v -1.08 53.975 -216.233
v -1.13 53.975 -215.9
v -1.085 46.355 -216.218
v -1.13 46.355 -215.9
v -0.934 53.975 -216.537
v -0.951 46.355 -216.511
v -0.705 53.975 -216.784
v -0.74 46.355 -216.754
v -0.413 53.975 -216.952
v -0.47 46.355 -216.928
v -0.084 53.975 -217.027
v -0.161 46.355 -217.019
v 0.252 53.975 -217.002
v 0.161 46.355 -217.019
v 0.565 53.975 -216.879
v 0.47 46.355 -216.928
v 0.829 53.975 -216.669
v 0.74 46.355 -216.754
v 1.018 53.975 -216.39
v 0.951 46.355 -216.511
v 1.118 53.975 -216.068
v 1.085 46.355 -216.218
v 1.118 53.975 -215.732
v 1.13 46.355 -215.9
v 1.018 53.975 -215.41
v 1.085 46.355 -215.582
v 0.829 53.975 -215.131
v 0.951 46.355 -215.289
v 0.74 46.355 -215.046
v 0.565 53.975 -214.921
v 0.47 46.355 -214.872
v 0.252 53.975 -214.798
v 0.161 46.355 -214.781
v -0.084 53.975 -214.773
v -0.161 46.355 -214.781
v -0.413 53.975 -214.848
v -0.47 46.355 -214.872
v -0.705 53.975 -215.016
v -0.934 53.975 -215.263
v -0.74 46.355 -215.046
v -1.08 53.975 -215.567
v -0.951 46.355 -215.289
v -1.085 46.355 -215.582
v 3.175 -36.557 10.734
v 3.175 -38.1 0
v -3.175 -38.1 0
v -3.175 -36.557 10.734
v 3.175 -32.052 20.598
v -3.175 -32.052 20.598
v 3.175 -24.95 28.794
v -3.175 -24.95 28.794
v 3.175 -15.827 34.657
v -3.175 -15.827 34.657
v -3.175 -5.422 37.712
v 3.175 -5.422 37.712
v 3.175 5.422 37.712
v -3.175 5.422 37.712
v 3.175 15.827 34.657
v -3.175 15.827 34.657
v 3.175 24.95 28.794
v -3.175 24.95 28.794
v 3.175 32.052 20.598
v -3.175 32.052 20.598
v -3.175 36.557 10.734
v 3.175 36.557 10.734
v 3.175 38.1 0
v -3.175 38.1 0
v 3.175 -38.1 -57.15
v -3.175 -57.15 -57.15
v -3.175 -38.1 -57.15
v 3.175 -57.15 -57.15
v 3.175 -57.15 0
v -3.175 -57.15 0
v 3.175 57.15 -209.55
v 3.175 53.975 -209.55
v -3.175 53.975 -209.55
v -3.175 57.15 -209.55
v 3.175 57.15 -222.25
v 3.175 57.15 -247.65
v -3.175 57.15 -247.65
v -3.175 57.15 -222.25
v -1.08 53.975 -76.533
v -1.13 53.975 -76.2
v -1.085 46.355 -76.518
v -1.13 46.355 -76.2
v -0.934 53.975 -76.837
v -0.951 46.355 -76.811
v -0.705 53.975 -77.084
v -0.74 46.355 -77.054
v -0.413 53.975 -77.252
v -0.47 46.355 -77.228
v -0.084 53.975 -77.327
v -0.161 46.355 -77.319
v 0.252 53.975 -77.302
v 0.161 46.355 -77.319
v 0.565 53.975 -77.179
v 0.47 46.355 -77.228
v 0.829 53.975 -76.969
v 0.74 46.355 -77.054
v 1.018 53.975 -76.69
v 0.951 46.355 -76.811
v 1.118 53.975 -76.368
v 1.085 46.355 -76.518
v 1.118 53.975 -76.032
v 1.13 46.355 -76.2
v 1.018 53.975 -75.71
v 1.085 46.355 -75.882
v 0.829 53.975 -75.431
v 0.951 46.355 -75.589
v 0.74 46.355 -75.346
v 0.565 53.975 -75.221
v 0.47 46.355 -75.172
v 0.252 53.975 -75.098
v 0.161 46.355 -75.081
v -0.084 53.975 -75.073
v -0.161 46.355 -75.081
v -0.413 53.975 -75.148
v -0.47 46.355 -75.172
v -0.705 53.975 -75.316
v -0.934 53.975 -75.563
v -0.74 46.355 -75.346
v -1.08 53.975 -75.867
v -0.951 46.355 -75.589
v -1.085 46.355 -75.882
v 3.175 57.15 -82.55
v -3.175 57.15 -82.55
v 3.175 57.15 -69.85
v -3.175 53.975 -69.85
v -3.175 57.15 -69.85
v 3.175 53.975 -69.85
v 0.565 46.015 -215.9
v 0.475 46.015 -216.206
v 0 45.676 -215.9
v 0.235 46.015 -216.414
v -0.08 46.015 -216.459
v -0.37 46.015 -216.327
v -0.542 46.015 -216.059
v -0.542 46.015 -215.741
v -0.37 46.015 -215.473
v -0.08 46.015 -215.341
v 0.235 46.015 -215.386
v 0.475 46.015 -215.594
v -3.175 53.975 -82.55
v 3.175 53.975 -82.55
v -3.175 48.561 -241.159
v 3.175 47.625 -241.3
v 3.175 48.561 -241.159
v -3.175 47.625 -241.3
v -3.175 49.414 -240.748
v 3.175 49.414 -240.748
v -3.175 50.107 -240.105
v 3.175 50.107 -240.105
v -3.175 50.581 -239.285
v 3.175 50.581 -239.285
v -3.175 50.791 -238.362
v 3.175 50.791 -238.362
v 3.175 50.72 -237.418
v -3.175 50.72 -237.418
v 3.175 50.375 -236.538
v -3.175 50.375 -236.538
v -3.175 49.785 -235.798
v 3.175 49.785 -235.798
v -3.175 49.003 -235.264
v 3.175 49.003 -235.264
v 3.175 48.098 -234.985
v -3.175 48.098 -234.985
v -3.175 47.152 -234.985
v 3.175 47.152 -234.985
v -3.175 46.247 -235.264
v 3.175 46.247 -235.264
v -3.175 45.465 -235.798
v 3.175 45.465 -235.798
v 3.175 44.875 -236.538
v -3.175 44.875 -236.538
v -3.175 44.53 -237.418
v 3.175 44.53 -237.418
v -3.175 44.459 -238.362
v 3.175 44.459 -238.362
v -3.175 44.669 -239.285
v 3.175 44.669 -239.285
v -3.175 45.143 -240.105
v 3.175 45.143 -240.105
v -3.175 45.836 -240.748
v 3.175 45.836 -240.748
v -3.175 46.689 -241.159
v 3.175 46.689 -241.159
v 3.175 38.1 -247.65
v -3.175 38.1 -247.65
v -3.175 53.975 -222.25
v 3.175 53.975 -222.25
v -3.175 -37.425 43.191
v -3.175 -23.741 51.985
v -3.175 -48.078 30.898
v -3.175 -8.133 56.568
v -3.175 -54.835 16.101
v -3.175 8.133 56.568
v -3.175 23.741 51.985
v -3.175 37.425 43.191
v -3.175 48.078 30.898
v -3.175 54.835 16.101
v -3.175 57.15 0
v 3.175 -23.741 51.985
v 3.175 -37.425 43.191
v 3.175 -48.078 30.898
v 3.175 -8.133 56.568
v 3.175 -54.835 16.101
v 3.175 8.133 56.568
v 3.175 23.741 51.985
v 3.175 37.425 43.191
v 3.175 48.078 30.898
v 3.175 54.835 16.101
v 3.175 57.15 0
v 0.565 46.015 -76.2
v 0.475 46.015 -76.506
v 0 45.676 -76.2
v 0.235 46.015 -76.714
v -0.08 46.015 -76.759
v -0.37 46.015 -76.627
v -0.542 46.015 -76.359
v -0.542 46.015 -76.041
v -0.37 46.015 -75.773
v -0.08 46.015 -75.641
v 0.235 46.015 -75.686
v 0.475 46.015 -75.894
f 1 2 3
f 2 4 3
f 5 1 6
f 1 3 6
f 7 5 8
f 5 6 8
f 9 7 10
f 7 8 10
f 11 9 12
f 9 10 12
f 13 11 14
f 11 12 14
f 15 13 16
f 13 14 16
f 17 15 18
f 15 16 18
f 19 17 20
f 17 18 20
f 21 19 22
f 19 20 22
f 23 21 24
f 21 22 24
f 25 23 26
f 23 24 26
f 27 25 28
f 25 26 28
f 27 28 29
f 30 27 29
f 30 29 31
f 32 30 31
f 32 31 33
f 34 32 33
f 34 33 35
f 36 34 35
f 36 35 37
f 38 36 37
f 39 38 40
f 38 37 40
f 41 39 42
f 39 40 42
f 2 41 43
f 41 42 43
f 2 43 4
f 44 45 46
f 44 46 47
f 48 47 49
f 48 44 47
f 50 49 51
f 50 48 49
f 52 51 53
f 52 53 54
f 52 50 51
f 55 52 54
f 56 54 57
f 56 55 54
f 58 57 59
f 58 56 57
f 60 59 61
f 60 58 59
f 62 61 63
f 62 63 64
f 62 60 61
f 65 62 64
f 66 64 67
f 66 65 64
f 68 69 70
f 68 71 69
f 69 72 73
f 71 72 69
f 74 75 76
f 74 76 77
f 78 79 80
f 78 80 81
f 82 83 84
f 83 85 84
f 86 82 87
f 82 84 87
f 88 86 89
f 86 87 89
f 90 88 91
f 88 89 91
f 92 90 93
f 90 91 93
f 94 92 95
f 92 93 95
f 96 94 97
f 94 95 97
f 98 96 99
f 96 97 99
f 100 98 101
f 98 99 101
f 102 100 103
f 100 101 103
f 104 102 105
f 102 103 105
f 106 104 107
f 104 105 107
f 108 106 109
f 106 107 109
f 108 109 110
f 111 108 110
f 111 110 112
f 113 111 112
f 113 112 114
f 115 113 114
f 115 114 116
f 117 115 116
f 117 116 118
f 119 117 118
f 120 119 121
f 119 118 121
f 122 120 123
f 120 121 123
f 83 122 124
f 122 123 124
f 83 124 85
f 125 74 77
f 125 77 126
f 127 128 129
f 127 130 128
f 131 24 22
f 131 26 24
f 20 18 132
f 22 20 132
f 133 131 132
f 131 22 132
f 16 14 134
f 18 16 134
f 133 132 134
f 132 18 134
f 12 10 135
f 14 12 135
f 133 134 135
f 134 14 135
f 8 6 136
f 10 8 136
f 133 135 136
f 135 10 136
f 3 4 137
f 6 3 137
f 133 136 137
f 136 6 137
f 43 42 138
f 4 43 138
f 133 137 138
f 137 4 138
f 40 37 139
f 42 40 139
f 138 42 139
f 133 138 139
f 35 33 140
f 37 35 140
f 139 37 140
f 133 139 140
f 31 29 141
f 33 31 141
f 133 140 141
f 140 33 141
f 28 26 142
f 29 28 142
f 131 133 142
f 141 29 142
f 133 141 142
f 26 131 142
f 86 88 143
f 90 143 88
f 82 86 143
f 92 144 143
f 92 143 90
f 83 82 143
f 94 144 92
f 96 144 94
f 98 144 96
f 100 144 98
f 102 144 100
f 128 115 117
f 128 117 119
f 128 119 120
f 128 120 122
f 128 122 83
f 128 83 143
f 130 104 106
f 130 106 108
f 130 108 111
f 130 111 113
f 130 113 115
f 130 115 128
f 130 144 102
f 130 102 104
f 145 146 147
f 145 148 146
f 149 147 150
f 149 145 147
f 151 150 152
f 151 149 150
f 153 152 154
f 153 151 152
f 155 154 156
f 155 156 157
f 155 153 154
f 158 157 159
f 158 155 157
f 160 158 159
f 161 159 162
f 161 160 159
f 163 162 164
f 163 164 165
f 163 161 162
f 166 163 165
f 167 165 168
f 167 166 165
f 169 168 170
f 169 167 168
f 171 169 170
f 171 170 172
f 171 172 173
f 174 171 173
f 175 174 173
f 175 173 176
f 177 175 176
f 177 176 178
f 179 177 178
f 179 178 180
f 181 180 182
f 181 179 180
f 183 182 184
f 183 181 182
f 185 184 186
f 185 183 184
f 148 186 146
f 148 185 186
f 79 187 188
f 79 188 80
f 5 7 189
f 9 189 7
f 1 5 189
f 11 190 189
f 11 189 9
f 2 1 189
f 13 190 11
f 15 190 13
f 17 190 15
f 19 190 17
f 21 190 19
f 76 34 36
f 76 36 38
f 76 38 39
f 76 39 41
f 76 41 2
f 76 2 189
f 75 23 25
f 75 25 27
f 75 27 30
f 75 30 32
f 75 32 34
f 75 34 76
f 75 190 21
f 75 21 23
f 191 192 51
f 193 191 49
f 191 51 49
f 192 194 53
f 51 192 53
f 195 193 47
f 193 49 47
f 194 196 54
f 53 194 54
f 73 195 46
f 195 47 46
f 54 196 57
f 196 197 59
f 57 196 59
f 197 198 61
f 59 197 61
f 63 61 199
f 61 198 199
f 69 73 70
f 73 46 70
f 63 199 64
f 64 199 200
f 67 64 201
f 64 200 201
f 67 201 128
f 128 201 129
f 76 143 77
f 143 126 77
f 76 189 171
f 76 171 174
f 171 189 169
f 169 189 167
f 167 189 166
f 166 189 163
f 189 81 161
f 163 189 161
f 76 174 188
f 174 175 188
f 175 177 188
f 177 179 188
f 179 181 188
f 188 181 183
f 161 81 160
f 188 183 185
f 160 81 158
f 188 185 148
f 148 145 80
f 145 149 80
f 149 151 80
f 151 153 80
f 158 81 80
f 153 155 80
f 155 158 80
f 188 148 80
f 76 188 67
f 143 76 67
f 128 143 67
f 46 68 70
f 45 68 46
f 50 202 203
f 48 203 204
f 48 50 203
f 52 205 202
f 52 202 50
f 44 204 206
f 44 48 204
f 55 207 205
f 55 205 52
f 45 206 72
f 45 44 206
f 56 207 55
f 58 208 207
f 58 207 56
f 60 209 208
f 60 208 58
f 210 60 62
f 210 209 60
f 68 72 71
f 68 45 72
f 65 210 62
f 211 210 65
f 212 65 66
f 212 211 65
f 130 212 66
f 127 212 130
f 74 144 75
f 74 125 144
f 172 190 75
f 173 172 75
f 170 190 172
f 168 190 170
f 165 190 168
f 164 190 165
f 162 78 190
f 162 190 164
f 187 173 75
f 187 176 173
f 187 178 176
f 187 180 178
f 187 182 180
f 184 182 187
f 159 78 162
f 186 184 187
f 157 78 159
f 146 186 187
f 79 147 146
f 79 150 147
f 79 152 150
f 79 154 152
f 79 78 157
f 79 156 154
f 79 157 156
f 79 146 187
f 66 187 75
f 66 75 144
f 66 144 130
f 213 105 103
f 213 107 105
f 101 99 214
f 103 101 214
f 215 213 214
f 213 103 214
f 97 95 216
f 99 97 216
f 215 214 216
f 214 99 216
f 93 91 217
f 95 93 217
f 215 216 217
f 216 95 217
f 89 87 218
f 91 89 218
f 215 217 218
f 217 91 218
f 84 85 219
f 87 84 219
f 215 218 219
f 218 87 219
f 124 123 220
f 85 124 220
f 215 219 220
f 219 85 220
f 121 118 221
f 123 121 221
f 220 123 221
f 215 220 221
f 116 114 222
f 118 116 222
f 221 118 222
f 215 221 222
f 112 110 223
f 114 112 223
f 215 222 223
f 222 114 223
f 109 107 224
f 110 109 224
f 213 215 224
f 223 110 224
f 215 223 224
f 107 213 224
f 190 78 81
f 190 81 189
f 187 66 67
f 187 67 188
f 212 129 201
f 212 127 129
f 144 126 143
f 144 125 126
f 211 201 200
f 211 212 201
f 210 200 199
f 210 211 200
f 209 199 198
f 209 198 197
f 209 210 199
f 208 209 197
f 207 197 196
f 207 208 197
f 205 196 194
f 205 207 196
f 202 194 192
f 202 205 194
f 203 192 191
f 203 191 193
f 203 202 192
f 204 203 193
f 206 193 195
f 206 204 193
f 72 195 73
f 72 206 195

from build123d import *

# Parameters (mm, degrees)
SKETCH1_R                 = 3.175
BOSS_EXTRUDE1_DEPTH       = 3.175
F_4_40_TAPPED_HOLE1_D     = 2.2606
F_4_40_TAPPED_HOLE1_DEPTH = 7.62
F_4_40_TAPPED_HOLE1_TIP   = 0.679152758


with BuildPart() as part:
    # Sketch1 → Boss-Extrude1 (new body, symmetric)
    with BuildSketch(Plane(origin=(0, 0, 0), x_dir=(0, 0, -1), z_dir=(1, 0, 0))):
        with BuildLine():
            Line((57.15, -38.1), (0, -38.1))
            ThreePointArc((0, -38.1), (-38.1, 0), (0, 38.1))
            Line((0, 38.1), (247.65, 38.1))
            Line((247.65, 38.1), (247.65, 57.15))
            Line((247.65, 57.15), (222.25, 57.15))
            Line((222.25, 57.15), (222.25, 53.975))
            Line((222.25, 53.975), (209.55, 53.975))
            Line((209.55, 53.975), (209.55, 57.15))
            Line((209.55, 57.15), (82.55, 57.15))
            Line((82.55, 57.15), (82.55, 53.975))
            Line((82.55, 53.975), (69.85, 53.975))
            Line((69.85, 53.975), (69.85, 57.15))
            Line((69.85, 57.15), (0, 57.15))
            ThreePointArc((0, 57.15), (-57.15, 0), (0, -57.15))
            Line((0, -57.15), (57.15, -57.15))
            Line((57.15, -57.15), (57.15, -38.1))
        make_face()
        with Locations((238.125, 47.625)):
            Circle(SKETCH1_R, mode=Mode.SUBTRACT)
    extrude(amount=BOSS_EXTRUDE1_DEPTH, both=True)

    # #4-40 Tapped Hole1
    with Locations(Plane(origin=(0, 53.975, 0), x_dir=(1, 0, 0), z_dir=(0, 1, 0))):
        with Locations((0, 76.2), (0, 215.9)):
            Hole(F_4_40_TAPPED_HOLE1_D / 2, depth=F_4_40_TAPPED_HOLE1_DEPTH)
            with Locations((0, 0, -(F_4_40_TAPPED_HOLE1_DEPTH + F_4_40_TAPPED_HOLE1_TIP / 2))):  # 118° drill point
                Cone(0, F_4_40_TAPPED_HOLE1_D / 2, F_4_40_TAPPED_HOLE1_TIP, mode=Mode.SUBTRACT)


solid = part.part
